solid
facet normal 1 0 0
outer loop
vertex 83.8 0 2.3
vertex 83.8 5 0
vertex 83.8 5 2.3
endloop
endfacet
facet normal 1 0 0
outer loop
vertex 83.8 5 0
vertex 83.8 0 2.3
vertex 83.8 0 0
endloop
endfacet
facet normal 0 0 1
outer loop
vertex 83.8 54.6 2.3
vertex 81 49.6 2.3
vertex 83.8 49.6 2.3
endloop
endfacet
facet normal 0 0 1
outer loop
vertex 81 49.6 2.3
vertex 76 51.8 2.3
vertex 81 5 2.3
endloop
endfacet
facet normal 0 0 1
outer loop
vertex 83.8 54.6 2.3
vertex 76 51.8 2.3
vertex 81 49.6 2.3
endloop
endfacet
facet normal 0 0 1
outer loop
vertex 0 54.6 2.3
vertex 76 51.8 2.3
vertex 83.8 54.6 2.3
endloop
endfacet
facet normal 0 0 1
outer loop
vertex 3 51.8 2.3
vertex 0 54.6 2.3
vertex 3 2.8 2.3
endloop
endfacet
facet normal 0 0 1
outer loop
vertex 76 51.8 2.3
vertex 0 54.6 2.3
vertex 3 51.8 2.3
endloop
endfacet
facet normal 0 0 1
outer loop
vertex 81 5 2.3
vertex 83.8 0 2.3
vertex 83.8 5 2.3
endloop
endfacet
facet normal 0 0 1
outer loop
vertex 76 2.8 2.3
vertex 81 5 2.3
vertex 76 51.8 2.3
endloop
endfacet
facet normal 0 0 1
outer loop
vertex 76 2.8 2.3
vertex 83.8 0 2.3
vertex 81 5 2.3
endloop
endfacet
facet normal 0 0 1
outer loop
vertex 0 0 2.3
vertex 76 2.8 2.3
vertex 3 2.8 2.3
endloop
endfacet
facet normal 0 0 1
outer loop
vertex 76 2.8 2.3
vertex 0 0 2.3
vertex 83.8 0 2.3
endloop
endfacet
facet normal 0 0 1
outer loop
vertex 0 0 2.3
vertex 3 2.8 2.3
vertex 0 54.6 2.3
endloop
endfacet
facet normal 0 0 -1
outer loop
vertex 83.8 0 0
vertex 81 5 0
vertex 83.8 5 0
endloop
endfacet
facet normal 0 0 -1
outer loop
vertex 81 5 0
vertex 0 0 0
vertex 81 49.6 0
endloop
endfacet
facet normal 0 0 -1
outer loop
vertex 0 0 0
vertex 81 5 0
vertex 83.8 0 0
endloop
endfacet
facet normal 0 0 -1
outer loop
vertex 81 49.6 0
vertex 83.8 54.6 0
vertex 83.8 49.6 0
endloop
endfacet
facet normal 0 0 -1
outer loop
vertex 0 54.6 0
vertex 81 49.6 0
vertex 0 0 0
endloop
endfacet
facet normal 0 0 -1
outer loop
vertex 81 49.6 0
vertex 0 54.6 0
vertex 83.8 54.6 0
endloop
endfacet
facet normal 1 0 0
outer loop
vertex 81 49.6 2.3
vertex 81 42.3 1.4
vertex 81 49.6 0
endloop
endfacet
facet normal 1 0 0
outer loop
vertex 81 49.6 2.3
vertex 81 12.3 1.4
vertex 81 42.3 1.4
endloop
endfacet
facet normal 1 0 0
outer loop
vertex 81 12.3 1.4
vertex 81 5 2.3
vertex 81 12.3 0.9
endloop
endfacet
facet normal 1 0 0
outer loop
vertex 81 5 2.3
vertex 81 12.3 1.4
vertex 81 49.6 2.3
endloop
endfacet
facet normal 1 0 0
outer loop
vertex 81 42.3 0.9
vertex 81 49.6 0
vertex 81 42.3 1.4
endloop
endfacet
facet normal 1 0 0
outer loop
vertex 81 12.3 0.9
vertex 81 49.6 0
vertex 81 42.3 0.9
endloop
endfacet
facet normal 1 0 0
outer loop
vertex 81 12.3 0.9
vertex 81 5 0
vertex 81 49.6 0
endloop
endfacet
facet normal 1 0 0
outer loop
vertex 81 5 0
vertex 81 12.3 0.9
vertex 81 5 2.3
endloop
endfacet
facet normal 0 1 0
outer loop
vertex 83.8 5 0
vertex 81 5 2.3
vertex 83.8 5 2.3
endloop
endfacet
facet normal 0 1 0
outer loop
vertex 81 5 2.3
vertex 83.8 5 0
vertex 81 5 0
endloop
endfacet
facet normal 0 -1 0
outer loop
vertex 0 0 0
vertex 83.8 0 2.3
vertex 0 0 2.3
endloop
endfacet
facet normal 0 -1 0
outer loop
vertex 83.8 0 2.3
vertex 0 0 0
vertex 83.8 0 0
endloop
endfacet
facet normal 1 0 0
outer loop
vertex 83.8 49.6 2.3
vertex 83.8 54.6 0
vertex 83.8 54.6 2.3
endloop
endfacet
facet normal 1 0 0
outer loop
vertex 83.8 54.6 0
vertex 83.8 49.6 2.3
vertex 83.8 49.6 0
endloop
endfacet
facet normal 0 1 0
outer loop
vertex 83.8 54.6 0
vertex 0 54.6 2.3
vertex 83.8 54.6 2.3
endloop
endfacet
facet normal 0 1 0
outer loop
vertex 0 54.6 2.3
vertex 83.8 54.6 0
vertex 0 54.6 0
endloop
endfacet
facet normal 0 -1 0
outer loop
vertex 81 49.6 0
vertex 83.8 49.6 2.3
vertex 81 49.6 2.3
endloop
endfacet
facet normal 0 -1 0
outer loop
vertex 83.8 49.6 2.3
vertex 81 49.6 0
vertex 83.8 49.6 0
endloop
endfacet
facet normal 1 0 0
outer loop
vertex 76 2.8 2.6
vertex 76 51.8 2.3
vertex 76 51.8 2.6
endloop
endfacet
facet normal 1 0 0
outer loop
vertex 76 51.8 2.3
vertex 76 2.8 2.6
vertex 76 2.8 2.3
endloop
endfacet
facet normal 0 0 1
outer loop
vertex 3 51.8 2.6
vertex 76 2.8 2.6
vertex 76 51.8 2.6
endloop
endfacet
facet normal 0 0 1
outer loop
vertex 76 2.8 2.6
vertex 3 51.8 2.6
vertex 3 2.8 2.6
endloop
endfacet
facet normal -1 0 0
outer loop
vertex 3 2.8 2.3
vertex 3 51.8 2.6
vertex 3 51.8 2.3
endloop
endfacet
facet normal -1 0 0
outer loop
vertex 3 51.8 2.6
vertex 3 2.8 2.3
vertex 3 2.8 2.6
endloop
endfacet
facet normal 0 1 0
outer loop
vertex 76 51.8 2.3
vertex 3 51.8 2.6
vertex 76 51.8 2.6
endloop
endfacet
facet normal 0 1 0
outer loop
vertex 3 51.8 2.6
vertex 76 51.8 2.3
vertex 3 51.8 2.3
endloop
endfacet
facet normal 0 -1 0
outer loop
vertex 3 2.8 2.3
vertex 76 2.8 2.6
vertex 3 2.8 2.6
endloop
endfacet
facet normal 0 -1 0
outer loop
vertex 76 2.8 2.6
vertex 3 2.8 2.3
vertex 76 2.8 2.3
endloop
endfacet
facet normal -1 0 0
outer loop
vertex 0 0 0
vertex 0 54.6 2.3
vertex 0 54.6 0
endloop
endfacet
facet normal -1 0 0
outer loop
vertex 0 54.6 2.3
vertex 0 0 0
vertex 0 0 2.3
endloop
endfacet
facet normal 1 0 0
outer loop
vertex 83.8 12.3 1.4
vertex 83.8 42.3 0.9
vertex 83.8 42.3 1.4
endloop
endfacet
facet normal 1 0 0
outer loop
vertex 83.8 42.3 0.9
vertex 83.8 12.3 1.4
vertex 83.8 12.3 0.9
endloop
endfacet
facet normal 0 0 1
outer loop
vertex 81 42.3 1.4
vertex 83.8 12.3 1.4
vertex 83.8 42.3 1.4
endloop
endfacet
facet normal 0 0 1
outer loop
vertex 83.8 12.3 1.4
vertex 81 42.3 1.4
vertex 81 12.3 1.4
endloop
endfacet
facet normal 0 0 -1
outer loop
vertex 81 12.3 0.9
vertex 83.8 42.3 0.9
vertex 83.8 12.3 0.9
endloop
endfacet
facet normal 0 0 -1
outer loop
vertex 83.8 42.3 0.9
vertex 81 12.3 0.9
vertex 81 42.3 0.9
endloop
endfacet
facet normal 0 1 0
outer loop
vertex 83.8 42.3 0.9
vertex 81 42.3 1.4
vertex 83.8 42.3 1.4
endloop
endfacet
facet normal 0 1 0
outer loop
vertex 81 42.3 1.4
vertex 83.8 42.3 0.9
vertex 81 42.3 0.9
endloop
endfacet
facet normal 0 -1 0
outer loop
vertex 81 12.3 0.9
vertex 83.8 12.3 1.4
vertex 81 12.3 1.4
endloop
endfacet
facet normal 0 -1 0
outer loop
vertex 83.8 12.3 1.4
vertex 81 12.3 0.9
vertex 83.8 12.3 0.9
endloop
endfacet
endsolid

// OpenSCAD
WSCR = 73; // Width of the display's visible part.
HSCR = 49; // Height of the display's visible part.
TSCR = .3; // Visible part of display thickness.

WDISP = 81; // Total width of the display.
HDISP = 54.6; // Total height of the display.
WTAIL = 83.80 - WDISP;
HTAIL = 5;
TDISP = 2.6 - TSCR; // Totatl thickness.

ML = 3; // Margin left.
MB = (HDISP - HSCR) / 2; // Margin bottom.
MR = WDISP - ML; // Margin right.
MT = MB; // Margin top.

module display() {
  color("#1a1c2c")
    translate([ML, MB, TSCR])
      cube([WSCR, HSCR, TDISP]);
  color("gray")
    cube([WDISP, HDISP, TDISP]);
  color("white") {
    translate([WDISP, 0, 0])
      cube([WTAIL, HTAIL, TDISP]);
    translate([WDISP, HDISP - HTAIL, 0])
      cube([WTAIL, HTAIL, TDISP]);
  }
  color("yellow")
    translate([WDISP, (HDISP - 30) / 2, (TDISP - .5) / 2])
      cube([WTAIL, 30, .5]);
}

display();
